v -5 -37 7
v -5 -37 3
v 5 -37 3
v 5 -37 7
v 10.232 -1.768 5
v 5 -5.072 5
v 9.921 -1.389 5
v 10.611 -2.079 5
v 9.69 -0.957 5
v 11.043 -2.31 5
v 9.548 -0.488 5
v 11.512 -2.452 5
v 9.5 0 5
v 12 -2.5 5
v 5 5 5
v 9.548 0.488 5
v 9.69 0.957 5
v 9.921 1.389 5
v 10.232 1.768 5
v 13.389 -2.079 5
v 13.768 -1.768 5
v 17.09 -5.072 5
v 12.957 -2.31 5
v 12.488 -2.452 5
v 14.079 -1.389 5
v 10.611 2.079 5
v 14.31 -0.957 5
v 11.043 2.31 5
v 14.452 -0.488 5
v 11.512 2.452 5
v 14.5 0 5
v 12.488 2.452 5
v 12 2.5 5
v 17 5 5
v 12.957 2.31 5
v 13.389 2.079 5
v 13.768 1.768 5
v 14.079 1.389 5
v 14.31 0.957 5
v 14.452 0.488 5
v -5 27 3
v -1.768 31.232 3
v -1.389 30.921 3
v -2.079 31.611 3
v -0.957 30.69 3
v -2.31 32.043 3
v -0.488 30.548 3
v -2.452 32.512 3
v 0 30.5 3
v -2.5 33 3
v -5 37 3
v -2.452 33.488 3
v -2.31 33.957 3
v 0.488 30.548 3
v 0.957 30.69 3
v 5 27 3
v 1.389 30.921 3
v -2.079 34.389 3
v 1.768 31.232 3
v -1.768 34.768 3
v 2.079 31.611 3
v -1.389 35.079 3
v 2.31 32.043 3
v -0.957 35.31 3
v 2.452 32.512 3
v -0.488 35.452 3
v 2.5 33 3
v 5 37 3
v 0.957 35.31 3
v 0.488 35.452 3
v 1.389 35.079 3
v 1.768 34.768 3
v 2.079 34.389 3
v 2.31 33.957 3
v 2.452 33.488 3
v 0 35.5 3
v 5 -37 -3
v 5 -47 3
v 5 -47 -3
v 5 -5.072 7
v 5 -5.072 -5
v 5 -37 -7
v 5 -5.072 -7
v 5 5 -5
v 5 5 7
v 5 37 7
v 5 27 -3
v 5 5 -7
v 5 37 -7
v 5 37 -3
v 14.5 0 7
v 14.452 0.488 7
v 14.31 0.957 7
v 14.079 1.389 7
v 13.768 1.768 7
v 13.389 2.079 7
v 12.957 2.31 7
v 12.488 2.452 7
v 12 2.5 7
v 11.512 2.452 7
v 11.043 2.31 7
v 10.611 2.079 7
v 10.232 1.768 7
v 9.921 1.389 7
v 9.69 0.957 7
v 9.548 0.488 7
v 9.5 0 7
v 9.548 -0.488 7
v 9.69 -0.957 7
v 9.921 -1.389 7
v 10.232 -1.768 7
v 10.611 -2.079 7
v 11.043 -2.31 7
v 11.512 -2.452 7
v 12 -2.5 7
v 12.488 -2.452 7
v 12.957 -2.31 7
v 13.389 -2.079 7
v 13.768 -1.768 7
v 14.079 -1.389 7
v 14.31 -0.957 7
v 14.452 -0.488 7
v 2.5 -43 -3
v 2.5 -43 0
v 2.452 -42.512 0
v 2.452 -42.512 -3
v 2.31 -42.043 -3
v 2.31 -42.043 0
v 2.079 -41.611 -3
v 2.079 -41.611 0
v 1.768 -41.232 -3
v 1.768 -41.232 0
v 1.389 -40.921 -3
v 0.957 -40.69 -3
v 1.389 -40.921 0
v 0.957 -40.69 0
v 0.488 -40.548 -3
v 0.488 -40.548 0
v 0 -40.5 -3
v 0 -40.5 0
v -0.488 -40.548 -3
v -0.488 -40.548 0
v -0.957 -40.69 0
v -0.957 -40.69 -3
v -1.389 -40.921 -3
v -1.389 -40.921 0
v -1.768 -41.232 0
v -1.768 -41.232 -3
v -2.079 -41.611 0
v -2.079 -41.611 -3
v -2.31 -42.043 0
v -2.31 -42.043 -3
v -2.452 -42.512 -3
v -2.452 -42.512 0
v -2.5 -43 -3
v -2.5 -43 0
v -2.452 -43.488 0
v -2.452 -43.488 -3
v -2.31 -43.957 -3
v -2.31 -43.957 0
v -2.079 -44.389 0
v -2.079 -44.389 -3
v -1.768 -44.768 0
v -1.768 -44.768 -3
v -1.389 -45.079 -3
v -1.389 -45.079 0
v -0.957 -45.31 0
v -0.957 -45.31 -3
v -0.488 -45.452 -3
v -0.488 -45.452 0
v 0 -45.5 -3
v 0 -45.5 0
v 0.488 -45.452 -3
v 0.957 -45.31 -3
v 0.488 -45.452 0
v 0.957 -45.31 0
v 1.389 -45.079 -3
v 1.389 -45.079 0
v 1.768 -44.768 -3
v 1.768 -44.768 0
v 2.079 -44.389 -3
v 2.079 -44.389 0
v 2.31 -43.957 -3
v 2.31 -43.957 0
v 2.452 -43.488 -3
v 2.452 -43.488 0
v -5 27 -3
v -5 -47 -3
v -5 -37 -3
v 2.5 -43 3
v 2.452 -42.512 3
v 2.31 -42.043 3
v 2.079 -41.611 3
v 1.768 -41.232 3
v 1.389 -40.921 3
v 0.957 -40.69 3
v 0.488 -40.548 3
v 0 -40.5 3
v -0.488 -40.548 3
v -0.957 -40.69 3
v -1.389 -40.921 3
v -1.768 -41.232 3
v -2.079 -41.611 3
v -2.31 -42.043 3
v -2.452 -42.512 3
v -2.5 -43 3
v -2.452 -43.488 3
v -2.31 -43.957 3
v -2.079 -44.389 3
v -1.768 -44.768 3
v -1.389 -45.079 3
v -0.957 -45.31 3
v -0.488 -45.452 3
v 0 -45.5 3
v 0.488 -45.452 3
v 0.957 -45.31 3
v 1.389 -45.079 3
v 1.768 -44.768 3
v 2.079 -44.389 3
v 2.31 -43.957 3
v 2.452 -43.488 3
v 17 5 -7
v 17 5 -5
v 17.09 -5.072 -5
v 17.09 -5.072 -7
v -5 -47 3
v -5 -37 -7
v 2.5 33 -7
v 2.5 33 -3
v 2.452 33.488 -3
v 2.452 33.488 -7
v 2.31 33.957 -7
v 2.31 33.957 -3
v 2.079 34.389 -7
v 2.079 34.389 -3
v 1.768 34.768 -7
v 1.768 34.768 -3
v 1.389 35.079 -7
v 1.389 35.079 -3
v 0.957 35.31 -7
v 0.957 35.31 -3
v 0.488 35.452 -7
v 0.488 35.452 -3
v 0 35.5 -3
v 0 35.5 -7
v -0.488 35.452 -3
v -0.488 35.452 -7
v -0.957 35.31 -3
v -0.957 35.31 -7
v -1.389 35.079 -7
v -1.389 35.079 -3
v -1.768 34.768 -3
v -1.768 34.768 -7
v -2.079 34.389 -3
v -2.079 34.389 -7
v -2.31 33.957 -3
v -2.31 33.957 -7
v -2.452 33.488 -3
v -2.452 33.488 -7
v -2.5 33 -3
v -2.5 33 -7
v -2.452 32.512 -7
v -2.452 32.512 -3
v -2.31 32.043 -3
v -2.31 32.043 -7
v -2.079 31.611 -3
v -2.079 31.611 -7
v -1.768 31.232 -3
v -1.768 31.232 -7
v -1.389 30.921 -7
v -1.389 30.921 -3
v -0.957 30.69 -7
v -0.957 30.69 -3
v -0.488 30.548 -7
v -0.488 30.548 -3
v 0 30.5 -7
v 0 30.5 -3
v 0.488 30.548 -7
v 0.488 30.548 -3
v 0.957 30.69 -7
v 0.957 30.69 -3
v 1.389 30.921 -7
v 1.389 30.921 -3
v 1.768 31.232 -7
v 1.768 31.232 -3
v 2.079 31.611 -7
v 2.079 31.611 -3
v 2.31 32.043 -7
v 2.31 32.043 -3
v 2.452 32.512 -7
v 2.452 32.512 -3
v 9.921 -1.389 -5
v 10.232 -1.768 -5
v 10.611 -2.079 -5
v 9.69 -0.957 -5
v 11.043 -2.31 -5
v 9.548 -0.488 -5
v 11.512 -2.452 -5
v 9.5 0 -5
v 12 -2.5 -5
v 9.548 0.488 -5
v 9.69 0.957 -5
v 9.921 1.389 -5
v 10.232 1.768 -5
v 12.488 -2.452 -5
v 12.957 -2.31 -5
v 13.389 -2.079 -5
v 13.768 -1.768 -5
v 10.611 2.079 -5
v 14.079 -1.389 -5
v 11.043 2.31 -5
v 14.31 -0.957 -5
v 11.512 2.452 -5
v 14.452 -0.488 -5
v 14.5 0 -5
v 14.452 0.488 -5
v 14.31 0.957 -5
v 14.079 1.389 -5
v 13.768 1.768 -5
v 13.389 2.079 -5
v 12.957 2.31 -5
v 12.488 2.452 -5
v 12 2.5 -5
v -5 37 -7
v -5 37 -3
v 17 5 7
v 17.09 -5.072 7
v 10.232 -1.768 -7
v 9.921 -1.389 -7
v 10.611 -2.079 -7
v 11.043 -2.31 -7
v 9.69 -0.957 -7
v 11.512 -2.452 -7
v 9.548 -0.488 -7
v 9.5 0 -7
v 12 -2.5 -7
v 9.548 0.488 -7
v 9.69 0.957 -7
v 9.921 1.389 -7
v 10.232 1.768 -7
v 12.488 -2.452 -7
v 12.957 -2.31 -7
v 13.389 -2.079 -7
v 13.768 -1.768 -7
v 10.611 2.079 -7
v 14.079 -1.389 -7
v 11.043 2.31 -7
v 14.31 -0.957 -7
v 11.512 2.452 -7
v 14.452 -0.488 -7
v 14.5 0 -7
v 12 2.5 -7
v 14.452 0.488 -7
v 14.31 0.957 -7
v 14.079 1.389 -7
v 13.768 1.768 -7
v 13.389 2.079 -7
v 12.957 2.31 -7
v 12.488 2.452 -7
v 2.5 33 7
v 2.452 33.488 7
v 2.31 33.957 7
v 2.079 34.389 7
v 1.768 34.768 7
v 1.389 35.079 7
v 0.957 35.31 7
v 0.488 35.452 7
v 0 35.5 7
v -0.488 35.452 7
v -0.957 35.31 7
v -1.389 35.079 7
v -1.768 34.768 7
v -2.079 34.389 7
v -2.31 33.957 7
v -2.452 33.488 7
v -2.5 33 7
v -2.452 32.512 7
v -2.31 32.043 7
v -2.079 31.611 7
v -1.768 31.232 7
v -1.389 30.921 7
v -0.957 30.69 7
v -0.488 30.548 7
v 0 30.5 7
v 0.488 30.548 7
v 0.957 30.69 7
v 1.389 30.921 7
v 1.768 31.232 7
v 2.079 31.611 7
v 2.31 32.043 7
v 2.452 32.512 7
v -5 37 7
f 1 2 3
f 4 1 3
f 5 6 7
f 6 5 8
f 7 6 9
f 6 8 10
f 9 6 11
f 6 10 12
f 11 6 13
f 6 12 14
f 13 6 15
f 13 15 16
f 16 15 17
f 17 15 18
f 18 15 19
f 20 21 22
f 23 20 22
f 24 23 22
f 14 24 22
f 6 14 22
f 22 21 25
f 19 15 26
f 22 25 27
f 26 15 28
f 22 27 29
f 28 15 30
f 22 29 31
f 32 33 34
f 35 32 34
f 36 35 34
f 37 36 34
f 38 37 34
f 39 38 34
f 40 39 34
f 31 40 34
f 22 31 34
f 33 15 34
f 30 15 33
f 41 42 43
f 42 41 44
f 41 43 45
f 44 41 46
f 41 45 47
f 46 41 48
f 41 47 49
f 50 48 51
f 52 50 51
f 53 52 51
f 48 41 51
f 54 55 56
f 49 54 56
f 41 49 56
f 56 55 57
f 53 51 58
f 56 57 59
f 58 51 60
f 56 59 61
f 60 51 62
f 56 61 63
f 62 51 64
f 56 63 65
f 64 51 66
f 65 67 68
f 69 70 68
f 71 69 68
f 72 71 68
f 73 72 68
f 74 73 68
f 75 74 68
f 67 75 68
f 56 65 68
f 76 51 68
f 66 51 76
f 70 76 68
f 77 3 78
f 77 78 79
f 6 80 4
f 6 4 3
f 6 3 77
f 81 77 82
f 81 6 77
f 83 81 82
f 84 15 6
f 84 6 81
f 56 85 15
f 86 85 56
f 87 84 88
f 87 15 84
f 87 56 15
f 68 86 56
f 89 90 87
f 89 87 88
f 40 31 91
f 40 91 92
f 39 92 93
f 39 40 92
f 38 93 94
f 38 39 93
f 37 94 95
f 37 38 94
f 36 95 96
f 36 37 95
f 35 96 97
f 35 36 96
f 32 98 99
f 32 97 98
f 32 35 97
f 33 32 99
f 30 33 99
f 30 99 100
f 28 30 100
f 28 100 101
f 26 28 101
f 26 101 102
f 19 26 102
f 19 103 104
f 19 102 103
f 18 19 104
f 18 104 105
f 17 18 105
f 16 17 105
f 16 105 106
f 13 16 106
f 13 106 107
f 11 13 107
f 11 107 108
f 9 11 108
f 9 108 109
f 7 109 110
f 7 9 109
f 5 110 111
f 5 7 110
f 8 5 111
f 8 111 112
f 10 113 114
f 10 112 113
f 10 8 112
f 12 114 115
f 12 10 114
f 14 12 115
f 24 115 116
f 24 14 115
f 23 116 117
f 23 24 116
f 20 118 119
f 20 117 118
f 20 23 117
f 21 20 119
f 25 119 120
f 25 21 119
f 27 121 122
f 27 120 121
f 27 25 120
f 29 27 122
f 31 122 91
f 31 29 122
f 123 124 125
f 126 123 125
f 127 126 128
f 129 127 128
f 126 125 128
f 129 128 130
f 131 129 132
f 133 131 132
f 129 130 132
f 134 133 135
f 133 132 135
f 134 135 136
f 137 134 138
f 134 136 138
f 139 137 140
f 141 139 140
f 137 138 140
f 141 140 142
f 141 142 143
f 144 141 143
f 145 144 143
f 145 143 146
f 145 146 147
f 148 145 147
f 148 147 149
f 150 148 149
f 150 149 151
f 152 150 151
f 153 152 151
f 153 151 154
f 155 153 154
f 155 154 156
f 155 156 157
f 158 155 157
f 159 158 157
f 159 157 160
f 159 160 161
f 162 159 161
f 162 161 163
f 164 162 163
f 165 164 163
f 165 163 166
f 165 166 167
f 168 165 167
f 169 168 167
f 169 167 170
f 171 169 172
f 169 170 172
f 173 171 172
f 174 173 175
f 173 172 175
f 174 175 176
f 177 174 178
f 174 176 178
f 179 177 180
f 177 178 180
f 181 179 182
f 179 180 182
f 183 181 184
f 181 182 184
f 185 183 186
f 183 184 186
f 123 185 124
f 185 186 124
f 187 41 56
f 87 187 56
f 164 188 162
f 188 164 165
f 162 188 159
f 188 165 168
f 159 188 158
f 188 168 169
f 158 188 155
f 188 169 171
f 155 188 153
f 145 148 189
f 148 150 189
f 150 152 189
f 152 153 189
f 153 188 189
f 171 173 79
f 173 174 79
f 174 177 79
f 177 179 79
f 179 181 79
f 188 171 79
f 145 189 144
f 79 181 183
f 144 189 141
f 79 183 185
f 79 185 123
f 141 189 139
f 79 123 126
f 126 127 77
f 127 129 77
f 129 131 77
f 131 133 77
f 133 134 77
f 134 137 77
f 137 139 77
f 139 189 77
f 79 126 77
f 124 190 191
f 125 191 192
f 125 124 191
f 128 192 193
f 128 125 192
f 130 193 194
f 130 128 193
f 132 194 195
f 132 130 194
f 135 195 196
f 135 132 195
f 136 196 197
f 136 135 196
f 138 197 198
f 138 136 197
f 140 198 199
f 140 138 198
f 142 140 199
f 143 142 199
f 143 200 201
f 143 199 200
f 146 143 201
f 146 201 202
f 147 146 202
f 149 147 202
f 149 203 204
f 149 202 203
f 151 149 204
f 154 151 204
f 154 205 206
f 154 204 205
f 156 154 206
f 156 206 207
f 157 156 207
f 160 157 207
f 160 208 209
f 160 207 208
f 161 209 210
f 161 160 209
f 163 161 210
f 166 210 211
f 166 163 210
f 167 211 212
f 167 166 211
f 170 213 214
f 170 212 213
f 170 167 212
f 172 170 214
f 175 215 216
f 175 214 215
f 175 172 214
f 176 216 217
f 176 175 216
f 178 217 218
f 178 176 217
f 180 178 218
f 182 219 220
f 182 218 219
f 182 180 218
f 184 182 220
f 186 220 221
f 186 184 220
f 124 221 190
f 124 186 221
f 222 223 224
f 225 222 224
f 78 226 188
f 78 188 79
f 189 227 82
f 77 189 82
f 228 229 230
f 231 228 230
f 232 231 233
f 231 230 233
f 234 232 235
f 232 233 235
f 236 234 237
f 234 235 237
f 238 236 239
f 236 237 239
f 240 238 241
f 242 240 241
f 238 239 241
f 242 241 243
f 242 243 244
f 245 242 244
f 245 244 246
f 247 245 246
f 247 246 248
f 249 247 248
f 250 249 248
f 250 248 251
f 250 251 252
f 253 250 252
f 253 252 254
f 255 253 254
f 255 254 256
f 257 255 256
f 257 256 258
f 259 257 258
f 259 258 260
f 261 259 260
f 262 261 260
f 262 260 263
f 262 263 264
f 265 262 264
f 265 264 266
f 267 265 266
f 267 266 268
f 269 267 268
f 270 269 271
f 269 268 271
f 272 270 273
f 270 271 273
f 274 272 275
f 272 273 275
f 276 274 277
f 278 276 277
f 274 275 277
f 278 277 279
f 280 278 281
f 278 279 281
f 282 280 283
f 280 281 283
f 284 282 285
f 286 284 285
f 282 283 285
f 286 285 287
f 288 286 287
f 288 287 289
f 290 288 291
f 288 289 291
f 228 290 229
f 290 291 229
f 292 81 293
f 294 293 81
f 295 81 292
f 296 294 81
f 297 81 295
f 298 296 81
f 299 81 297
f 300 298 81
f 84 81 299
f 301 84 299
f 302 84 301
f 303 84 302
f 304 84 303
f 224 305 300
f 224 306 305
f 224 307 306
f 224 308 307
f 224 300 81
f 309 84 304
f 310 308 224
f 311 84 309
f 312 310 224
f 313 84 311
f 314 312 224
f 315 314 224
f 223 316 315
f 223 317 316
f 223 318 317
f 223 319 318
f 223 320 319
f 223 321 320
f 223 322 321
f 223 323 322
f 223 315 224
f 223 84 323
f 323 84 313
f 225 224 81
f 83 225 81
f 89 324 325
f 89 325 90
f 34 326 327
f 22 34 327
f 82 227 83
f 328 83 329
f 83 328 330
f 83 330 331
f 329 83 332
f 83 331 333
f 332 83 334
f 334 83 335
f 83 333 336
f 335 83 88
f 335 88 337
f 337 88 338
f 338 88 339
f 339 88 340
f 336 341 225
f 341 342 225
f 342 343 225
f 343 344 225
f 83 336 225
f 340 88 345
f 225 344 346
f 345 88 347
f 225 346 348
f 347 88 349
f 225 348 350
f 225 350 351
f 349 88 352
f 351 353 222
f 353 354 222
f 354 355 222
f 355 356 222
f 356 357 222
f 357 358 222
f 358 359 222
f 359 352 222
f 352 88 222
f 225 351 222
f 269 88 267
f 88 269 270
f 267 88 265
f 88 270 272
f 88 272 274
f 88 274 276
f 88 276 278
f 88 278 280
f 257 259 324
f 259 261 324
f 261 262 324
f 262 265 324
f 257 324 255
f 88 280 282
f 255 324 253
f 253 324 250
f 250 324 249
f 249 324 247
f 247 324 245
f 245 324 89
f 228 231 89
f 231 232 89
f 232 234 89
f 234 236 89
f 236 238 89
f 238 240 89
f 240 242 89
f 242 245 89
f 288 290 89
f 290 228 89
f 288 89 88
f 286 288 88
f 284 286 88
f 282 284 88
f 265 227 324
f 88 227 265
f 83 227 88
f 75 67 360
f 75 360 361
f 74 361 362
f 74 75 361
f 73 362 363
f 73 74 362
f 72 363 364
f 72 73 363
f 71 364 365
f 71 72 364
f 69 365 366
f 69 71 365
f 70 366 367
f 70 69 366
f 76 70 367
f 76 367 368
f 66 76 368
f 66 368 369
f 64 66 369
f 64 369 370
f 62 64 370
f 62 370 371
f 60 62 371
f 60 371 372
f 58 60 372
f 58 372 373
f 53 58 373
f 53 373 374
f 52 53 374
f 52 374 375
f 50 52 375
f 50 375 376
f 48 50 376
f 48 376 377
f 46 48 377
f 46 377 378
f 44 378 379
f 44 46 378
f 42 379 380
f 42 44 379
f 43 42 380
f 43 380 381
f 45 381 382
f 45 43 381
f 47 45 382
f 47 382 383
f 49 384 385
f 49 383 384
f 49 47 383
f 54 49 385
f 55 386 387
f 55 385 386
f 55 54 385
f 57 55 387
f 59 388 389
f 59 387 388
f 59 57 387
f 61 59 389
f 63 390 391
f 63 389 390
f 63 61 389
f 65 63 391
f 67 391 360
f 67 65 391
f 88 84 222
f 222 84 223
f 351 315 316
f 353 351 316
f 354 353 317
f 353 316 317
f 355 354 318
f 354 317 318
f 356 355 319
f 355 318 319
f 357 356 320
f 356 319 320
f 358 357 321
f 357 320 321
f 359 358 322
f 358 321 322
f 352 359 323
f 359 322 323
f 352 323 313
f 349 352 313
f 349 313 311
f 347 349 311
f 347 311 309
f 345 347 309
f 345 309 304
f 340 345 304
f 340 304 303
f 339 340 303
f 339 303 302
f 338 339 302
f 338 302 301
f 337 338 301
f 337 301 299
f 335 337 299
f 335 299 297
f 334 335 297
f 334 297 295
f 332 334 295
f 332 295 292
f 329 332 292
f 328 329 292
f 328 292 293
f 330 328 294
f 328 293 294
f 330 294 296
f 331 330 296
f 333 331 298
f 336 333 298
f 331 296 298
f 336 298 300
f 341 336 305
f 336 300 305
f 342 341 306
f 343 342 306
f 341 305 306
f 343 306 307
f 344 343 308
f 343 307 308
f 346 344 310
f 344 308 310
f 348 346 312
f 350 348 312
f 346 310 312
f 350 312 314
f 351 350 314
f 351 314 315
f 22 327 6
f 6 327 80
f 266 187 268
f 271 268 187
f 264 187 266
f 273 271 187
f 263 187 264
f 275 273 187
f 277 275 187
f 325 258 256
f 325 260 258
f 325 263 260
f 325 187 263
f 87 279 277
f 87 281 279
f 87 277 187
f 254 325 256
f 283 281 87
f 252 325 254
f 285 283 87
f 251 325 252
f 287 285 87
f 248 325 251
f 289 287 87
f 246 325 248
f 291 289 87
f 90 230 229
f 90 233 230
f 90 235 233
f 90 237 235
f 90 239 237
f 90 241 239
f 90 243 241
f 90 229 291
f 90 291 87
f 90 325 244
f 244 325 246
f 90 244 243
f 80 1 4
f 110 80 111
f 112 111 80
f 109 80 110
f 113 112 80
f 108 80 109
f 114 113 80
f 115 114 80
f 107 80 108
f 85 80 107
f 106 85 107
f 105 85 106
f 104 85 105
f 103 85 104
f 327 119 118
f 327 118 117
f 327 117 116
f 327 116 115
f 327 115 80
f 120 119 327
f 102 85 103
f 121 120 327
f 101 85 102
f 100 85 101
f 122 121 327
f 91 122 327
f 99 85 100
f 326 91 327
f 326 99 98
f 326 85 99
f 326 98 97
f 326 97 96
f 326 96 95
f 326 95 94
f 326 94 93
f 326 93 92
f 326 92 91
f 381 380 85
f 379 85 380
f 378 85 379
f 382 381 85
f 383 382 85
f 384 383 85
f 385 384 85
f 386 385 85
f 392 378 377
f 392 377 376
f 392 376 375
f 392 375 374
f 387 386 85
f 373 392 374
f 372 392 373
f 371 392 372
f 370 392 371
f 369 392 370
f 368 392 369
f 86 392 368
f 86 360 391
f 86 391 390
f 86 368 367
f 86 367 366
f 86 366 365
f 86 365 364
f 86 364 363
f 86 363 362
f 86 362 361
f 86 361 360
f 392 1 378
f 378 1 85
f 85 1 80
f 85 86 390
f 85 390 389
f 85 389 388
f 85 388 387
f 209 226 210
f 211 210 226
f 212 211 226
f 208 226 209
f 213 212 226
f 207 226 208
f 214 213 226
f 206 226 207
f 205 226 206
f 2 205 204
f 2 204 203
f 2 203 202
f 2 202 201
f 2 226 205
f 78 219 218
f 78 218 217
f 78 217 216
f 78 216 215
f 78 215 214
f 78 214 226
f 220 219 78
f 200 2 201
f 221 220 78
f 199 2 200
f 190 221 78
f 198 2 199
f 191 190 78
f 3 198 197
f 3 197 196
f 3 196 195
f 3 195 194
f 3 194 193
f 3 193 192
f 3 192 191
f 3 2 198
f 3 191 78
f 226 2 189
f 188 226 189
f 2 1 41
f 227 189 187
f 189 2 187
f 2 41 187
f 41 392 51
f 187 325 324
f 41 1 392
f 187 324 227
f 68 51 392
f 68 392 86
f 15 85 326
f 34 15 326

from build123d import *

# Parameters (mm, degrees)
SKETCH_1_W                = 10
SKETCH_1_H                = 14
EXTRUDE_1_DEPTH           = 37
EXTRUDE_3_DEPTH           = 7
SKETCH_8_W                = 12.090263245
SKETCH_8_H                = 10.07196207
CUT_EXTRUDE_3_DEPTH       = 5
SKETCH_10_R               = 2.5
CUT_EXTRUDE_4_DEPTH       = 8
CUT_EXTRUDE_4_DEPTH_BACK  = 8
SKETCH_14_W               = 10
SKETCH_14_H               = 10
CUT_EXTRUDE_8_DEPTH       = 3
SKETCH_15_W               = 10
SKETCH_15_H               = 10
EXTRUDE_4_DEPTH           = 3
SKETCH_16_R               = 2.5
CUT_EXTRUDE_9_DEPTH       = 8
CUT_EXTRUDE_9_DEPTH_BACK  = 8
SKETCH_17_R               = 2.5
CUT_EXTRUDE_10_DEPTH      = 8
CUT_EXTRUDE_10_DEPTH_BACK = 8


with BuildPart() as part:
    # 草图1 → 凸台-拉伸1 (new body, symmetric)
    with BuildSketch(Plane(origin=(0, 0, 0), x_dir=(1, 0, 0), z_dir=(0, 1, 0))):
        Rectangle(SKETCH_1_W, SKETCH_1_H)
    extrude(amount=EXTRUDE_1_DEPTH, both=True)

    # 草图7 → 凸台-拉伸3 (add, symmetric)
    with BuildSketch(Plane.XY):
        Polygon((5, 5), (17, 5), (17.090263245, -5.07196207), (5, -5.07196207), align=None)
    extrude(amount=EXTRUDE_3_DEPTH, both=True)

    # 草图8 → 切除-拉伸3 (cut, symmetric)
    with BuildSketch(Plane.XY):
        with Locations((11.045131623, -0.035981035)):
            Rectangle(SKETCH_8_W, SKETCH_8_H)
    extrude(amount=CUT_EXTRUDE_3_DEPTH, both=True, mode=Mode.SUBTRACT)

    # 草图10 → 切除-拉伸4 (cut, two sides)
    with BuildSketch(Plane.XY) as cut_extrude_4_sk:
        with Locations((12, 0)):
            Circle(SKETCH_10_R)
    extrude(amount=CUT_EXTRUDE_4_DEPTH, mode=Mode.SUBTRACT)
    extrude(cut_extrude_4_sk.sketch, amount=-CUT_EXTRUDE_4_DEPTH_BACK, mode=Mode.SUBTRACT)

    # 草图14 → 切除-拉伸8 (cut, symmetric)
    with BuildSketch(Plane.XY):
        with Locations((0, 32)):
            Rectangle(SKETCH_14_W, SKETCH_14_H)
    extrude(amount=CUT_EXTRUDE_8_DEPTH, both=True, mode=Mode.SUBTRACT)

    # 草图15 → 凸台-拉伸4 (add, symmetric)
    with BuildSketch(Plane.XY):
        with Locations((0, -42)):
            Rectangle(SKETCH_15_W, SKETCH_15_H)
    extrude(amount=EXTRUDE_4_DEPTH, both=True)

    # 草图16 → 切除-拉伸9 (cut, two sides)
    with BuildSketch(Plane.XY) as cut_extrude_9_sk:
        with Locations((0, 33)):
            Circle(SKETCH_16_R)
    extrude(amount=CUT_EXTRUDE_9_DEPTH, mode=Mode.SUBTRACT)
    extrude(cut_extrude_9_sk.sketch, amount=-CUT_EXTRUDE_9_DEPTH_BACK, mode=Mode.SUBTRACT)

    # 草图17 → 切除-拉伸10 (cut, two sides)
    with BuildSketch(Plane.XY) as cut_extrude_10_sk:
        with Locations((0, -43)):
            Circle(SKETCH_17_R)
    extrude(amount=CUT_EXTRUDE_10_DEPTH, mode=Mode.SUBTRACT)
    extrude(cut_extrude_10_sk.sketch, amount=-CUT_EXTRUDE_10_DEPTH_BACK, mode=Mode.SUBTRACT)


solid = part.part
